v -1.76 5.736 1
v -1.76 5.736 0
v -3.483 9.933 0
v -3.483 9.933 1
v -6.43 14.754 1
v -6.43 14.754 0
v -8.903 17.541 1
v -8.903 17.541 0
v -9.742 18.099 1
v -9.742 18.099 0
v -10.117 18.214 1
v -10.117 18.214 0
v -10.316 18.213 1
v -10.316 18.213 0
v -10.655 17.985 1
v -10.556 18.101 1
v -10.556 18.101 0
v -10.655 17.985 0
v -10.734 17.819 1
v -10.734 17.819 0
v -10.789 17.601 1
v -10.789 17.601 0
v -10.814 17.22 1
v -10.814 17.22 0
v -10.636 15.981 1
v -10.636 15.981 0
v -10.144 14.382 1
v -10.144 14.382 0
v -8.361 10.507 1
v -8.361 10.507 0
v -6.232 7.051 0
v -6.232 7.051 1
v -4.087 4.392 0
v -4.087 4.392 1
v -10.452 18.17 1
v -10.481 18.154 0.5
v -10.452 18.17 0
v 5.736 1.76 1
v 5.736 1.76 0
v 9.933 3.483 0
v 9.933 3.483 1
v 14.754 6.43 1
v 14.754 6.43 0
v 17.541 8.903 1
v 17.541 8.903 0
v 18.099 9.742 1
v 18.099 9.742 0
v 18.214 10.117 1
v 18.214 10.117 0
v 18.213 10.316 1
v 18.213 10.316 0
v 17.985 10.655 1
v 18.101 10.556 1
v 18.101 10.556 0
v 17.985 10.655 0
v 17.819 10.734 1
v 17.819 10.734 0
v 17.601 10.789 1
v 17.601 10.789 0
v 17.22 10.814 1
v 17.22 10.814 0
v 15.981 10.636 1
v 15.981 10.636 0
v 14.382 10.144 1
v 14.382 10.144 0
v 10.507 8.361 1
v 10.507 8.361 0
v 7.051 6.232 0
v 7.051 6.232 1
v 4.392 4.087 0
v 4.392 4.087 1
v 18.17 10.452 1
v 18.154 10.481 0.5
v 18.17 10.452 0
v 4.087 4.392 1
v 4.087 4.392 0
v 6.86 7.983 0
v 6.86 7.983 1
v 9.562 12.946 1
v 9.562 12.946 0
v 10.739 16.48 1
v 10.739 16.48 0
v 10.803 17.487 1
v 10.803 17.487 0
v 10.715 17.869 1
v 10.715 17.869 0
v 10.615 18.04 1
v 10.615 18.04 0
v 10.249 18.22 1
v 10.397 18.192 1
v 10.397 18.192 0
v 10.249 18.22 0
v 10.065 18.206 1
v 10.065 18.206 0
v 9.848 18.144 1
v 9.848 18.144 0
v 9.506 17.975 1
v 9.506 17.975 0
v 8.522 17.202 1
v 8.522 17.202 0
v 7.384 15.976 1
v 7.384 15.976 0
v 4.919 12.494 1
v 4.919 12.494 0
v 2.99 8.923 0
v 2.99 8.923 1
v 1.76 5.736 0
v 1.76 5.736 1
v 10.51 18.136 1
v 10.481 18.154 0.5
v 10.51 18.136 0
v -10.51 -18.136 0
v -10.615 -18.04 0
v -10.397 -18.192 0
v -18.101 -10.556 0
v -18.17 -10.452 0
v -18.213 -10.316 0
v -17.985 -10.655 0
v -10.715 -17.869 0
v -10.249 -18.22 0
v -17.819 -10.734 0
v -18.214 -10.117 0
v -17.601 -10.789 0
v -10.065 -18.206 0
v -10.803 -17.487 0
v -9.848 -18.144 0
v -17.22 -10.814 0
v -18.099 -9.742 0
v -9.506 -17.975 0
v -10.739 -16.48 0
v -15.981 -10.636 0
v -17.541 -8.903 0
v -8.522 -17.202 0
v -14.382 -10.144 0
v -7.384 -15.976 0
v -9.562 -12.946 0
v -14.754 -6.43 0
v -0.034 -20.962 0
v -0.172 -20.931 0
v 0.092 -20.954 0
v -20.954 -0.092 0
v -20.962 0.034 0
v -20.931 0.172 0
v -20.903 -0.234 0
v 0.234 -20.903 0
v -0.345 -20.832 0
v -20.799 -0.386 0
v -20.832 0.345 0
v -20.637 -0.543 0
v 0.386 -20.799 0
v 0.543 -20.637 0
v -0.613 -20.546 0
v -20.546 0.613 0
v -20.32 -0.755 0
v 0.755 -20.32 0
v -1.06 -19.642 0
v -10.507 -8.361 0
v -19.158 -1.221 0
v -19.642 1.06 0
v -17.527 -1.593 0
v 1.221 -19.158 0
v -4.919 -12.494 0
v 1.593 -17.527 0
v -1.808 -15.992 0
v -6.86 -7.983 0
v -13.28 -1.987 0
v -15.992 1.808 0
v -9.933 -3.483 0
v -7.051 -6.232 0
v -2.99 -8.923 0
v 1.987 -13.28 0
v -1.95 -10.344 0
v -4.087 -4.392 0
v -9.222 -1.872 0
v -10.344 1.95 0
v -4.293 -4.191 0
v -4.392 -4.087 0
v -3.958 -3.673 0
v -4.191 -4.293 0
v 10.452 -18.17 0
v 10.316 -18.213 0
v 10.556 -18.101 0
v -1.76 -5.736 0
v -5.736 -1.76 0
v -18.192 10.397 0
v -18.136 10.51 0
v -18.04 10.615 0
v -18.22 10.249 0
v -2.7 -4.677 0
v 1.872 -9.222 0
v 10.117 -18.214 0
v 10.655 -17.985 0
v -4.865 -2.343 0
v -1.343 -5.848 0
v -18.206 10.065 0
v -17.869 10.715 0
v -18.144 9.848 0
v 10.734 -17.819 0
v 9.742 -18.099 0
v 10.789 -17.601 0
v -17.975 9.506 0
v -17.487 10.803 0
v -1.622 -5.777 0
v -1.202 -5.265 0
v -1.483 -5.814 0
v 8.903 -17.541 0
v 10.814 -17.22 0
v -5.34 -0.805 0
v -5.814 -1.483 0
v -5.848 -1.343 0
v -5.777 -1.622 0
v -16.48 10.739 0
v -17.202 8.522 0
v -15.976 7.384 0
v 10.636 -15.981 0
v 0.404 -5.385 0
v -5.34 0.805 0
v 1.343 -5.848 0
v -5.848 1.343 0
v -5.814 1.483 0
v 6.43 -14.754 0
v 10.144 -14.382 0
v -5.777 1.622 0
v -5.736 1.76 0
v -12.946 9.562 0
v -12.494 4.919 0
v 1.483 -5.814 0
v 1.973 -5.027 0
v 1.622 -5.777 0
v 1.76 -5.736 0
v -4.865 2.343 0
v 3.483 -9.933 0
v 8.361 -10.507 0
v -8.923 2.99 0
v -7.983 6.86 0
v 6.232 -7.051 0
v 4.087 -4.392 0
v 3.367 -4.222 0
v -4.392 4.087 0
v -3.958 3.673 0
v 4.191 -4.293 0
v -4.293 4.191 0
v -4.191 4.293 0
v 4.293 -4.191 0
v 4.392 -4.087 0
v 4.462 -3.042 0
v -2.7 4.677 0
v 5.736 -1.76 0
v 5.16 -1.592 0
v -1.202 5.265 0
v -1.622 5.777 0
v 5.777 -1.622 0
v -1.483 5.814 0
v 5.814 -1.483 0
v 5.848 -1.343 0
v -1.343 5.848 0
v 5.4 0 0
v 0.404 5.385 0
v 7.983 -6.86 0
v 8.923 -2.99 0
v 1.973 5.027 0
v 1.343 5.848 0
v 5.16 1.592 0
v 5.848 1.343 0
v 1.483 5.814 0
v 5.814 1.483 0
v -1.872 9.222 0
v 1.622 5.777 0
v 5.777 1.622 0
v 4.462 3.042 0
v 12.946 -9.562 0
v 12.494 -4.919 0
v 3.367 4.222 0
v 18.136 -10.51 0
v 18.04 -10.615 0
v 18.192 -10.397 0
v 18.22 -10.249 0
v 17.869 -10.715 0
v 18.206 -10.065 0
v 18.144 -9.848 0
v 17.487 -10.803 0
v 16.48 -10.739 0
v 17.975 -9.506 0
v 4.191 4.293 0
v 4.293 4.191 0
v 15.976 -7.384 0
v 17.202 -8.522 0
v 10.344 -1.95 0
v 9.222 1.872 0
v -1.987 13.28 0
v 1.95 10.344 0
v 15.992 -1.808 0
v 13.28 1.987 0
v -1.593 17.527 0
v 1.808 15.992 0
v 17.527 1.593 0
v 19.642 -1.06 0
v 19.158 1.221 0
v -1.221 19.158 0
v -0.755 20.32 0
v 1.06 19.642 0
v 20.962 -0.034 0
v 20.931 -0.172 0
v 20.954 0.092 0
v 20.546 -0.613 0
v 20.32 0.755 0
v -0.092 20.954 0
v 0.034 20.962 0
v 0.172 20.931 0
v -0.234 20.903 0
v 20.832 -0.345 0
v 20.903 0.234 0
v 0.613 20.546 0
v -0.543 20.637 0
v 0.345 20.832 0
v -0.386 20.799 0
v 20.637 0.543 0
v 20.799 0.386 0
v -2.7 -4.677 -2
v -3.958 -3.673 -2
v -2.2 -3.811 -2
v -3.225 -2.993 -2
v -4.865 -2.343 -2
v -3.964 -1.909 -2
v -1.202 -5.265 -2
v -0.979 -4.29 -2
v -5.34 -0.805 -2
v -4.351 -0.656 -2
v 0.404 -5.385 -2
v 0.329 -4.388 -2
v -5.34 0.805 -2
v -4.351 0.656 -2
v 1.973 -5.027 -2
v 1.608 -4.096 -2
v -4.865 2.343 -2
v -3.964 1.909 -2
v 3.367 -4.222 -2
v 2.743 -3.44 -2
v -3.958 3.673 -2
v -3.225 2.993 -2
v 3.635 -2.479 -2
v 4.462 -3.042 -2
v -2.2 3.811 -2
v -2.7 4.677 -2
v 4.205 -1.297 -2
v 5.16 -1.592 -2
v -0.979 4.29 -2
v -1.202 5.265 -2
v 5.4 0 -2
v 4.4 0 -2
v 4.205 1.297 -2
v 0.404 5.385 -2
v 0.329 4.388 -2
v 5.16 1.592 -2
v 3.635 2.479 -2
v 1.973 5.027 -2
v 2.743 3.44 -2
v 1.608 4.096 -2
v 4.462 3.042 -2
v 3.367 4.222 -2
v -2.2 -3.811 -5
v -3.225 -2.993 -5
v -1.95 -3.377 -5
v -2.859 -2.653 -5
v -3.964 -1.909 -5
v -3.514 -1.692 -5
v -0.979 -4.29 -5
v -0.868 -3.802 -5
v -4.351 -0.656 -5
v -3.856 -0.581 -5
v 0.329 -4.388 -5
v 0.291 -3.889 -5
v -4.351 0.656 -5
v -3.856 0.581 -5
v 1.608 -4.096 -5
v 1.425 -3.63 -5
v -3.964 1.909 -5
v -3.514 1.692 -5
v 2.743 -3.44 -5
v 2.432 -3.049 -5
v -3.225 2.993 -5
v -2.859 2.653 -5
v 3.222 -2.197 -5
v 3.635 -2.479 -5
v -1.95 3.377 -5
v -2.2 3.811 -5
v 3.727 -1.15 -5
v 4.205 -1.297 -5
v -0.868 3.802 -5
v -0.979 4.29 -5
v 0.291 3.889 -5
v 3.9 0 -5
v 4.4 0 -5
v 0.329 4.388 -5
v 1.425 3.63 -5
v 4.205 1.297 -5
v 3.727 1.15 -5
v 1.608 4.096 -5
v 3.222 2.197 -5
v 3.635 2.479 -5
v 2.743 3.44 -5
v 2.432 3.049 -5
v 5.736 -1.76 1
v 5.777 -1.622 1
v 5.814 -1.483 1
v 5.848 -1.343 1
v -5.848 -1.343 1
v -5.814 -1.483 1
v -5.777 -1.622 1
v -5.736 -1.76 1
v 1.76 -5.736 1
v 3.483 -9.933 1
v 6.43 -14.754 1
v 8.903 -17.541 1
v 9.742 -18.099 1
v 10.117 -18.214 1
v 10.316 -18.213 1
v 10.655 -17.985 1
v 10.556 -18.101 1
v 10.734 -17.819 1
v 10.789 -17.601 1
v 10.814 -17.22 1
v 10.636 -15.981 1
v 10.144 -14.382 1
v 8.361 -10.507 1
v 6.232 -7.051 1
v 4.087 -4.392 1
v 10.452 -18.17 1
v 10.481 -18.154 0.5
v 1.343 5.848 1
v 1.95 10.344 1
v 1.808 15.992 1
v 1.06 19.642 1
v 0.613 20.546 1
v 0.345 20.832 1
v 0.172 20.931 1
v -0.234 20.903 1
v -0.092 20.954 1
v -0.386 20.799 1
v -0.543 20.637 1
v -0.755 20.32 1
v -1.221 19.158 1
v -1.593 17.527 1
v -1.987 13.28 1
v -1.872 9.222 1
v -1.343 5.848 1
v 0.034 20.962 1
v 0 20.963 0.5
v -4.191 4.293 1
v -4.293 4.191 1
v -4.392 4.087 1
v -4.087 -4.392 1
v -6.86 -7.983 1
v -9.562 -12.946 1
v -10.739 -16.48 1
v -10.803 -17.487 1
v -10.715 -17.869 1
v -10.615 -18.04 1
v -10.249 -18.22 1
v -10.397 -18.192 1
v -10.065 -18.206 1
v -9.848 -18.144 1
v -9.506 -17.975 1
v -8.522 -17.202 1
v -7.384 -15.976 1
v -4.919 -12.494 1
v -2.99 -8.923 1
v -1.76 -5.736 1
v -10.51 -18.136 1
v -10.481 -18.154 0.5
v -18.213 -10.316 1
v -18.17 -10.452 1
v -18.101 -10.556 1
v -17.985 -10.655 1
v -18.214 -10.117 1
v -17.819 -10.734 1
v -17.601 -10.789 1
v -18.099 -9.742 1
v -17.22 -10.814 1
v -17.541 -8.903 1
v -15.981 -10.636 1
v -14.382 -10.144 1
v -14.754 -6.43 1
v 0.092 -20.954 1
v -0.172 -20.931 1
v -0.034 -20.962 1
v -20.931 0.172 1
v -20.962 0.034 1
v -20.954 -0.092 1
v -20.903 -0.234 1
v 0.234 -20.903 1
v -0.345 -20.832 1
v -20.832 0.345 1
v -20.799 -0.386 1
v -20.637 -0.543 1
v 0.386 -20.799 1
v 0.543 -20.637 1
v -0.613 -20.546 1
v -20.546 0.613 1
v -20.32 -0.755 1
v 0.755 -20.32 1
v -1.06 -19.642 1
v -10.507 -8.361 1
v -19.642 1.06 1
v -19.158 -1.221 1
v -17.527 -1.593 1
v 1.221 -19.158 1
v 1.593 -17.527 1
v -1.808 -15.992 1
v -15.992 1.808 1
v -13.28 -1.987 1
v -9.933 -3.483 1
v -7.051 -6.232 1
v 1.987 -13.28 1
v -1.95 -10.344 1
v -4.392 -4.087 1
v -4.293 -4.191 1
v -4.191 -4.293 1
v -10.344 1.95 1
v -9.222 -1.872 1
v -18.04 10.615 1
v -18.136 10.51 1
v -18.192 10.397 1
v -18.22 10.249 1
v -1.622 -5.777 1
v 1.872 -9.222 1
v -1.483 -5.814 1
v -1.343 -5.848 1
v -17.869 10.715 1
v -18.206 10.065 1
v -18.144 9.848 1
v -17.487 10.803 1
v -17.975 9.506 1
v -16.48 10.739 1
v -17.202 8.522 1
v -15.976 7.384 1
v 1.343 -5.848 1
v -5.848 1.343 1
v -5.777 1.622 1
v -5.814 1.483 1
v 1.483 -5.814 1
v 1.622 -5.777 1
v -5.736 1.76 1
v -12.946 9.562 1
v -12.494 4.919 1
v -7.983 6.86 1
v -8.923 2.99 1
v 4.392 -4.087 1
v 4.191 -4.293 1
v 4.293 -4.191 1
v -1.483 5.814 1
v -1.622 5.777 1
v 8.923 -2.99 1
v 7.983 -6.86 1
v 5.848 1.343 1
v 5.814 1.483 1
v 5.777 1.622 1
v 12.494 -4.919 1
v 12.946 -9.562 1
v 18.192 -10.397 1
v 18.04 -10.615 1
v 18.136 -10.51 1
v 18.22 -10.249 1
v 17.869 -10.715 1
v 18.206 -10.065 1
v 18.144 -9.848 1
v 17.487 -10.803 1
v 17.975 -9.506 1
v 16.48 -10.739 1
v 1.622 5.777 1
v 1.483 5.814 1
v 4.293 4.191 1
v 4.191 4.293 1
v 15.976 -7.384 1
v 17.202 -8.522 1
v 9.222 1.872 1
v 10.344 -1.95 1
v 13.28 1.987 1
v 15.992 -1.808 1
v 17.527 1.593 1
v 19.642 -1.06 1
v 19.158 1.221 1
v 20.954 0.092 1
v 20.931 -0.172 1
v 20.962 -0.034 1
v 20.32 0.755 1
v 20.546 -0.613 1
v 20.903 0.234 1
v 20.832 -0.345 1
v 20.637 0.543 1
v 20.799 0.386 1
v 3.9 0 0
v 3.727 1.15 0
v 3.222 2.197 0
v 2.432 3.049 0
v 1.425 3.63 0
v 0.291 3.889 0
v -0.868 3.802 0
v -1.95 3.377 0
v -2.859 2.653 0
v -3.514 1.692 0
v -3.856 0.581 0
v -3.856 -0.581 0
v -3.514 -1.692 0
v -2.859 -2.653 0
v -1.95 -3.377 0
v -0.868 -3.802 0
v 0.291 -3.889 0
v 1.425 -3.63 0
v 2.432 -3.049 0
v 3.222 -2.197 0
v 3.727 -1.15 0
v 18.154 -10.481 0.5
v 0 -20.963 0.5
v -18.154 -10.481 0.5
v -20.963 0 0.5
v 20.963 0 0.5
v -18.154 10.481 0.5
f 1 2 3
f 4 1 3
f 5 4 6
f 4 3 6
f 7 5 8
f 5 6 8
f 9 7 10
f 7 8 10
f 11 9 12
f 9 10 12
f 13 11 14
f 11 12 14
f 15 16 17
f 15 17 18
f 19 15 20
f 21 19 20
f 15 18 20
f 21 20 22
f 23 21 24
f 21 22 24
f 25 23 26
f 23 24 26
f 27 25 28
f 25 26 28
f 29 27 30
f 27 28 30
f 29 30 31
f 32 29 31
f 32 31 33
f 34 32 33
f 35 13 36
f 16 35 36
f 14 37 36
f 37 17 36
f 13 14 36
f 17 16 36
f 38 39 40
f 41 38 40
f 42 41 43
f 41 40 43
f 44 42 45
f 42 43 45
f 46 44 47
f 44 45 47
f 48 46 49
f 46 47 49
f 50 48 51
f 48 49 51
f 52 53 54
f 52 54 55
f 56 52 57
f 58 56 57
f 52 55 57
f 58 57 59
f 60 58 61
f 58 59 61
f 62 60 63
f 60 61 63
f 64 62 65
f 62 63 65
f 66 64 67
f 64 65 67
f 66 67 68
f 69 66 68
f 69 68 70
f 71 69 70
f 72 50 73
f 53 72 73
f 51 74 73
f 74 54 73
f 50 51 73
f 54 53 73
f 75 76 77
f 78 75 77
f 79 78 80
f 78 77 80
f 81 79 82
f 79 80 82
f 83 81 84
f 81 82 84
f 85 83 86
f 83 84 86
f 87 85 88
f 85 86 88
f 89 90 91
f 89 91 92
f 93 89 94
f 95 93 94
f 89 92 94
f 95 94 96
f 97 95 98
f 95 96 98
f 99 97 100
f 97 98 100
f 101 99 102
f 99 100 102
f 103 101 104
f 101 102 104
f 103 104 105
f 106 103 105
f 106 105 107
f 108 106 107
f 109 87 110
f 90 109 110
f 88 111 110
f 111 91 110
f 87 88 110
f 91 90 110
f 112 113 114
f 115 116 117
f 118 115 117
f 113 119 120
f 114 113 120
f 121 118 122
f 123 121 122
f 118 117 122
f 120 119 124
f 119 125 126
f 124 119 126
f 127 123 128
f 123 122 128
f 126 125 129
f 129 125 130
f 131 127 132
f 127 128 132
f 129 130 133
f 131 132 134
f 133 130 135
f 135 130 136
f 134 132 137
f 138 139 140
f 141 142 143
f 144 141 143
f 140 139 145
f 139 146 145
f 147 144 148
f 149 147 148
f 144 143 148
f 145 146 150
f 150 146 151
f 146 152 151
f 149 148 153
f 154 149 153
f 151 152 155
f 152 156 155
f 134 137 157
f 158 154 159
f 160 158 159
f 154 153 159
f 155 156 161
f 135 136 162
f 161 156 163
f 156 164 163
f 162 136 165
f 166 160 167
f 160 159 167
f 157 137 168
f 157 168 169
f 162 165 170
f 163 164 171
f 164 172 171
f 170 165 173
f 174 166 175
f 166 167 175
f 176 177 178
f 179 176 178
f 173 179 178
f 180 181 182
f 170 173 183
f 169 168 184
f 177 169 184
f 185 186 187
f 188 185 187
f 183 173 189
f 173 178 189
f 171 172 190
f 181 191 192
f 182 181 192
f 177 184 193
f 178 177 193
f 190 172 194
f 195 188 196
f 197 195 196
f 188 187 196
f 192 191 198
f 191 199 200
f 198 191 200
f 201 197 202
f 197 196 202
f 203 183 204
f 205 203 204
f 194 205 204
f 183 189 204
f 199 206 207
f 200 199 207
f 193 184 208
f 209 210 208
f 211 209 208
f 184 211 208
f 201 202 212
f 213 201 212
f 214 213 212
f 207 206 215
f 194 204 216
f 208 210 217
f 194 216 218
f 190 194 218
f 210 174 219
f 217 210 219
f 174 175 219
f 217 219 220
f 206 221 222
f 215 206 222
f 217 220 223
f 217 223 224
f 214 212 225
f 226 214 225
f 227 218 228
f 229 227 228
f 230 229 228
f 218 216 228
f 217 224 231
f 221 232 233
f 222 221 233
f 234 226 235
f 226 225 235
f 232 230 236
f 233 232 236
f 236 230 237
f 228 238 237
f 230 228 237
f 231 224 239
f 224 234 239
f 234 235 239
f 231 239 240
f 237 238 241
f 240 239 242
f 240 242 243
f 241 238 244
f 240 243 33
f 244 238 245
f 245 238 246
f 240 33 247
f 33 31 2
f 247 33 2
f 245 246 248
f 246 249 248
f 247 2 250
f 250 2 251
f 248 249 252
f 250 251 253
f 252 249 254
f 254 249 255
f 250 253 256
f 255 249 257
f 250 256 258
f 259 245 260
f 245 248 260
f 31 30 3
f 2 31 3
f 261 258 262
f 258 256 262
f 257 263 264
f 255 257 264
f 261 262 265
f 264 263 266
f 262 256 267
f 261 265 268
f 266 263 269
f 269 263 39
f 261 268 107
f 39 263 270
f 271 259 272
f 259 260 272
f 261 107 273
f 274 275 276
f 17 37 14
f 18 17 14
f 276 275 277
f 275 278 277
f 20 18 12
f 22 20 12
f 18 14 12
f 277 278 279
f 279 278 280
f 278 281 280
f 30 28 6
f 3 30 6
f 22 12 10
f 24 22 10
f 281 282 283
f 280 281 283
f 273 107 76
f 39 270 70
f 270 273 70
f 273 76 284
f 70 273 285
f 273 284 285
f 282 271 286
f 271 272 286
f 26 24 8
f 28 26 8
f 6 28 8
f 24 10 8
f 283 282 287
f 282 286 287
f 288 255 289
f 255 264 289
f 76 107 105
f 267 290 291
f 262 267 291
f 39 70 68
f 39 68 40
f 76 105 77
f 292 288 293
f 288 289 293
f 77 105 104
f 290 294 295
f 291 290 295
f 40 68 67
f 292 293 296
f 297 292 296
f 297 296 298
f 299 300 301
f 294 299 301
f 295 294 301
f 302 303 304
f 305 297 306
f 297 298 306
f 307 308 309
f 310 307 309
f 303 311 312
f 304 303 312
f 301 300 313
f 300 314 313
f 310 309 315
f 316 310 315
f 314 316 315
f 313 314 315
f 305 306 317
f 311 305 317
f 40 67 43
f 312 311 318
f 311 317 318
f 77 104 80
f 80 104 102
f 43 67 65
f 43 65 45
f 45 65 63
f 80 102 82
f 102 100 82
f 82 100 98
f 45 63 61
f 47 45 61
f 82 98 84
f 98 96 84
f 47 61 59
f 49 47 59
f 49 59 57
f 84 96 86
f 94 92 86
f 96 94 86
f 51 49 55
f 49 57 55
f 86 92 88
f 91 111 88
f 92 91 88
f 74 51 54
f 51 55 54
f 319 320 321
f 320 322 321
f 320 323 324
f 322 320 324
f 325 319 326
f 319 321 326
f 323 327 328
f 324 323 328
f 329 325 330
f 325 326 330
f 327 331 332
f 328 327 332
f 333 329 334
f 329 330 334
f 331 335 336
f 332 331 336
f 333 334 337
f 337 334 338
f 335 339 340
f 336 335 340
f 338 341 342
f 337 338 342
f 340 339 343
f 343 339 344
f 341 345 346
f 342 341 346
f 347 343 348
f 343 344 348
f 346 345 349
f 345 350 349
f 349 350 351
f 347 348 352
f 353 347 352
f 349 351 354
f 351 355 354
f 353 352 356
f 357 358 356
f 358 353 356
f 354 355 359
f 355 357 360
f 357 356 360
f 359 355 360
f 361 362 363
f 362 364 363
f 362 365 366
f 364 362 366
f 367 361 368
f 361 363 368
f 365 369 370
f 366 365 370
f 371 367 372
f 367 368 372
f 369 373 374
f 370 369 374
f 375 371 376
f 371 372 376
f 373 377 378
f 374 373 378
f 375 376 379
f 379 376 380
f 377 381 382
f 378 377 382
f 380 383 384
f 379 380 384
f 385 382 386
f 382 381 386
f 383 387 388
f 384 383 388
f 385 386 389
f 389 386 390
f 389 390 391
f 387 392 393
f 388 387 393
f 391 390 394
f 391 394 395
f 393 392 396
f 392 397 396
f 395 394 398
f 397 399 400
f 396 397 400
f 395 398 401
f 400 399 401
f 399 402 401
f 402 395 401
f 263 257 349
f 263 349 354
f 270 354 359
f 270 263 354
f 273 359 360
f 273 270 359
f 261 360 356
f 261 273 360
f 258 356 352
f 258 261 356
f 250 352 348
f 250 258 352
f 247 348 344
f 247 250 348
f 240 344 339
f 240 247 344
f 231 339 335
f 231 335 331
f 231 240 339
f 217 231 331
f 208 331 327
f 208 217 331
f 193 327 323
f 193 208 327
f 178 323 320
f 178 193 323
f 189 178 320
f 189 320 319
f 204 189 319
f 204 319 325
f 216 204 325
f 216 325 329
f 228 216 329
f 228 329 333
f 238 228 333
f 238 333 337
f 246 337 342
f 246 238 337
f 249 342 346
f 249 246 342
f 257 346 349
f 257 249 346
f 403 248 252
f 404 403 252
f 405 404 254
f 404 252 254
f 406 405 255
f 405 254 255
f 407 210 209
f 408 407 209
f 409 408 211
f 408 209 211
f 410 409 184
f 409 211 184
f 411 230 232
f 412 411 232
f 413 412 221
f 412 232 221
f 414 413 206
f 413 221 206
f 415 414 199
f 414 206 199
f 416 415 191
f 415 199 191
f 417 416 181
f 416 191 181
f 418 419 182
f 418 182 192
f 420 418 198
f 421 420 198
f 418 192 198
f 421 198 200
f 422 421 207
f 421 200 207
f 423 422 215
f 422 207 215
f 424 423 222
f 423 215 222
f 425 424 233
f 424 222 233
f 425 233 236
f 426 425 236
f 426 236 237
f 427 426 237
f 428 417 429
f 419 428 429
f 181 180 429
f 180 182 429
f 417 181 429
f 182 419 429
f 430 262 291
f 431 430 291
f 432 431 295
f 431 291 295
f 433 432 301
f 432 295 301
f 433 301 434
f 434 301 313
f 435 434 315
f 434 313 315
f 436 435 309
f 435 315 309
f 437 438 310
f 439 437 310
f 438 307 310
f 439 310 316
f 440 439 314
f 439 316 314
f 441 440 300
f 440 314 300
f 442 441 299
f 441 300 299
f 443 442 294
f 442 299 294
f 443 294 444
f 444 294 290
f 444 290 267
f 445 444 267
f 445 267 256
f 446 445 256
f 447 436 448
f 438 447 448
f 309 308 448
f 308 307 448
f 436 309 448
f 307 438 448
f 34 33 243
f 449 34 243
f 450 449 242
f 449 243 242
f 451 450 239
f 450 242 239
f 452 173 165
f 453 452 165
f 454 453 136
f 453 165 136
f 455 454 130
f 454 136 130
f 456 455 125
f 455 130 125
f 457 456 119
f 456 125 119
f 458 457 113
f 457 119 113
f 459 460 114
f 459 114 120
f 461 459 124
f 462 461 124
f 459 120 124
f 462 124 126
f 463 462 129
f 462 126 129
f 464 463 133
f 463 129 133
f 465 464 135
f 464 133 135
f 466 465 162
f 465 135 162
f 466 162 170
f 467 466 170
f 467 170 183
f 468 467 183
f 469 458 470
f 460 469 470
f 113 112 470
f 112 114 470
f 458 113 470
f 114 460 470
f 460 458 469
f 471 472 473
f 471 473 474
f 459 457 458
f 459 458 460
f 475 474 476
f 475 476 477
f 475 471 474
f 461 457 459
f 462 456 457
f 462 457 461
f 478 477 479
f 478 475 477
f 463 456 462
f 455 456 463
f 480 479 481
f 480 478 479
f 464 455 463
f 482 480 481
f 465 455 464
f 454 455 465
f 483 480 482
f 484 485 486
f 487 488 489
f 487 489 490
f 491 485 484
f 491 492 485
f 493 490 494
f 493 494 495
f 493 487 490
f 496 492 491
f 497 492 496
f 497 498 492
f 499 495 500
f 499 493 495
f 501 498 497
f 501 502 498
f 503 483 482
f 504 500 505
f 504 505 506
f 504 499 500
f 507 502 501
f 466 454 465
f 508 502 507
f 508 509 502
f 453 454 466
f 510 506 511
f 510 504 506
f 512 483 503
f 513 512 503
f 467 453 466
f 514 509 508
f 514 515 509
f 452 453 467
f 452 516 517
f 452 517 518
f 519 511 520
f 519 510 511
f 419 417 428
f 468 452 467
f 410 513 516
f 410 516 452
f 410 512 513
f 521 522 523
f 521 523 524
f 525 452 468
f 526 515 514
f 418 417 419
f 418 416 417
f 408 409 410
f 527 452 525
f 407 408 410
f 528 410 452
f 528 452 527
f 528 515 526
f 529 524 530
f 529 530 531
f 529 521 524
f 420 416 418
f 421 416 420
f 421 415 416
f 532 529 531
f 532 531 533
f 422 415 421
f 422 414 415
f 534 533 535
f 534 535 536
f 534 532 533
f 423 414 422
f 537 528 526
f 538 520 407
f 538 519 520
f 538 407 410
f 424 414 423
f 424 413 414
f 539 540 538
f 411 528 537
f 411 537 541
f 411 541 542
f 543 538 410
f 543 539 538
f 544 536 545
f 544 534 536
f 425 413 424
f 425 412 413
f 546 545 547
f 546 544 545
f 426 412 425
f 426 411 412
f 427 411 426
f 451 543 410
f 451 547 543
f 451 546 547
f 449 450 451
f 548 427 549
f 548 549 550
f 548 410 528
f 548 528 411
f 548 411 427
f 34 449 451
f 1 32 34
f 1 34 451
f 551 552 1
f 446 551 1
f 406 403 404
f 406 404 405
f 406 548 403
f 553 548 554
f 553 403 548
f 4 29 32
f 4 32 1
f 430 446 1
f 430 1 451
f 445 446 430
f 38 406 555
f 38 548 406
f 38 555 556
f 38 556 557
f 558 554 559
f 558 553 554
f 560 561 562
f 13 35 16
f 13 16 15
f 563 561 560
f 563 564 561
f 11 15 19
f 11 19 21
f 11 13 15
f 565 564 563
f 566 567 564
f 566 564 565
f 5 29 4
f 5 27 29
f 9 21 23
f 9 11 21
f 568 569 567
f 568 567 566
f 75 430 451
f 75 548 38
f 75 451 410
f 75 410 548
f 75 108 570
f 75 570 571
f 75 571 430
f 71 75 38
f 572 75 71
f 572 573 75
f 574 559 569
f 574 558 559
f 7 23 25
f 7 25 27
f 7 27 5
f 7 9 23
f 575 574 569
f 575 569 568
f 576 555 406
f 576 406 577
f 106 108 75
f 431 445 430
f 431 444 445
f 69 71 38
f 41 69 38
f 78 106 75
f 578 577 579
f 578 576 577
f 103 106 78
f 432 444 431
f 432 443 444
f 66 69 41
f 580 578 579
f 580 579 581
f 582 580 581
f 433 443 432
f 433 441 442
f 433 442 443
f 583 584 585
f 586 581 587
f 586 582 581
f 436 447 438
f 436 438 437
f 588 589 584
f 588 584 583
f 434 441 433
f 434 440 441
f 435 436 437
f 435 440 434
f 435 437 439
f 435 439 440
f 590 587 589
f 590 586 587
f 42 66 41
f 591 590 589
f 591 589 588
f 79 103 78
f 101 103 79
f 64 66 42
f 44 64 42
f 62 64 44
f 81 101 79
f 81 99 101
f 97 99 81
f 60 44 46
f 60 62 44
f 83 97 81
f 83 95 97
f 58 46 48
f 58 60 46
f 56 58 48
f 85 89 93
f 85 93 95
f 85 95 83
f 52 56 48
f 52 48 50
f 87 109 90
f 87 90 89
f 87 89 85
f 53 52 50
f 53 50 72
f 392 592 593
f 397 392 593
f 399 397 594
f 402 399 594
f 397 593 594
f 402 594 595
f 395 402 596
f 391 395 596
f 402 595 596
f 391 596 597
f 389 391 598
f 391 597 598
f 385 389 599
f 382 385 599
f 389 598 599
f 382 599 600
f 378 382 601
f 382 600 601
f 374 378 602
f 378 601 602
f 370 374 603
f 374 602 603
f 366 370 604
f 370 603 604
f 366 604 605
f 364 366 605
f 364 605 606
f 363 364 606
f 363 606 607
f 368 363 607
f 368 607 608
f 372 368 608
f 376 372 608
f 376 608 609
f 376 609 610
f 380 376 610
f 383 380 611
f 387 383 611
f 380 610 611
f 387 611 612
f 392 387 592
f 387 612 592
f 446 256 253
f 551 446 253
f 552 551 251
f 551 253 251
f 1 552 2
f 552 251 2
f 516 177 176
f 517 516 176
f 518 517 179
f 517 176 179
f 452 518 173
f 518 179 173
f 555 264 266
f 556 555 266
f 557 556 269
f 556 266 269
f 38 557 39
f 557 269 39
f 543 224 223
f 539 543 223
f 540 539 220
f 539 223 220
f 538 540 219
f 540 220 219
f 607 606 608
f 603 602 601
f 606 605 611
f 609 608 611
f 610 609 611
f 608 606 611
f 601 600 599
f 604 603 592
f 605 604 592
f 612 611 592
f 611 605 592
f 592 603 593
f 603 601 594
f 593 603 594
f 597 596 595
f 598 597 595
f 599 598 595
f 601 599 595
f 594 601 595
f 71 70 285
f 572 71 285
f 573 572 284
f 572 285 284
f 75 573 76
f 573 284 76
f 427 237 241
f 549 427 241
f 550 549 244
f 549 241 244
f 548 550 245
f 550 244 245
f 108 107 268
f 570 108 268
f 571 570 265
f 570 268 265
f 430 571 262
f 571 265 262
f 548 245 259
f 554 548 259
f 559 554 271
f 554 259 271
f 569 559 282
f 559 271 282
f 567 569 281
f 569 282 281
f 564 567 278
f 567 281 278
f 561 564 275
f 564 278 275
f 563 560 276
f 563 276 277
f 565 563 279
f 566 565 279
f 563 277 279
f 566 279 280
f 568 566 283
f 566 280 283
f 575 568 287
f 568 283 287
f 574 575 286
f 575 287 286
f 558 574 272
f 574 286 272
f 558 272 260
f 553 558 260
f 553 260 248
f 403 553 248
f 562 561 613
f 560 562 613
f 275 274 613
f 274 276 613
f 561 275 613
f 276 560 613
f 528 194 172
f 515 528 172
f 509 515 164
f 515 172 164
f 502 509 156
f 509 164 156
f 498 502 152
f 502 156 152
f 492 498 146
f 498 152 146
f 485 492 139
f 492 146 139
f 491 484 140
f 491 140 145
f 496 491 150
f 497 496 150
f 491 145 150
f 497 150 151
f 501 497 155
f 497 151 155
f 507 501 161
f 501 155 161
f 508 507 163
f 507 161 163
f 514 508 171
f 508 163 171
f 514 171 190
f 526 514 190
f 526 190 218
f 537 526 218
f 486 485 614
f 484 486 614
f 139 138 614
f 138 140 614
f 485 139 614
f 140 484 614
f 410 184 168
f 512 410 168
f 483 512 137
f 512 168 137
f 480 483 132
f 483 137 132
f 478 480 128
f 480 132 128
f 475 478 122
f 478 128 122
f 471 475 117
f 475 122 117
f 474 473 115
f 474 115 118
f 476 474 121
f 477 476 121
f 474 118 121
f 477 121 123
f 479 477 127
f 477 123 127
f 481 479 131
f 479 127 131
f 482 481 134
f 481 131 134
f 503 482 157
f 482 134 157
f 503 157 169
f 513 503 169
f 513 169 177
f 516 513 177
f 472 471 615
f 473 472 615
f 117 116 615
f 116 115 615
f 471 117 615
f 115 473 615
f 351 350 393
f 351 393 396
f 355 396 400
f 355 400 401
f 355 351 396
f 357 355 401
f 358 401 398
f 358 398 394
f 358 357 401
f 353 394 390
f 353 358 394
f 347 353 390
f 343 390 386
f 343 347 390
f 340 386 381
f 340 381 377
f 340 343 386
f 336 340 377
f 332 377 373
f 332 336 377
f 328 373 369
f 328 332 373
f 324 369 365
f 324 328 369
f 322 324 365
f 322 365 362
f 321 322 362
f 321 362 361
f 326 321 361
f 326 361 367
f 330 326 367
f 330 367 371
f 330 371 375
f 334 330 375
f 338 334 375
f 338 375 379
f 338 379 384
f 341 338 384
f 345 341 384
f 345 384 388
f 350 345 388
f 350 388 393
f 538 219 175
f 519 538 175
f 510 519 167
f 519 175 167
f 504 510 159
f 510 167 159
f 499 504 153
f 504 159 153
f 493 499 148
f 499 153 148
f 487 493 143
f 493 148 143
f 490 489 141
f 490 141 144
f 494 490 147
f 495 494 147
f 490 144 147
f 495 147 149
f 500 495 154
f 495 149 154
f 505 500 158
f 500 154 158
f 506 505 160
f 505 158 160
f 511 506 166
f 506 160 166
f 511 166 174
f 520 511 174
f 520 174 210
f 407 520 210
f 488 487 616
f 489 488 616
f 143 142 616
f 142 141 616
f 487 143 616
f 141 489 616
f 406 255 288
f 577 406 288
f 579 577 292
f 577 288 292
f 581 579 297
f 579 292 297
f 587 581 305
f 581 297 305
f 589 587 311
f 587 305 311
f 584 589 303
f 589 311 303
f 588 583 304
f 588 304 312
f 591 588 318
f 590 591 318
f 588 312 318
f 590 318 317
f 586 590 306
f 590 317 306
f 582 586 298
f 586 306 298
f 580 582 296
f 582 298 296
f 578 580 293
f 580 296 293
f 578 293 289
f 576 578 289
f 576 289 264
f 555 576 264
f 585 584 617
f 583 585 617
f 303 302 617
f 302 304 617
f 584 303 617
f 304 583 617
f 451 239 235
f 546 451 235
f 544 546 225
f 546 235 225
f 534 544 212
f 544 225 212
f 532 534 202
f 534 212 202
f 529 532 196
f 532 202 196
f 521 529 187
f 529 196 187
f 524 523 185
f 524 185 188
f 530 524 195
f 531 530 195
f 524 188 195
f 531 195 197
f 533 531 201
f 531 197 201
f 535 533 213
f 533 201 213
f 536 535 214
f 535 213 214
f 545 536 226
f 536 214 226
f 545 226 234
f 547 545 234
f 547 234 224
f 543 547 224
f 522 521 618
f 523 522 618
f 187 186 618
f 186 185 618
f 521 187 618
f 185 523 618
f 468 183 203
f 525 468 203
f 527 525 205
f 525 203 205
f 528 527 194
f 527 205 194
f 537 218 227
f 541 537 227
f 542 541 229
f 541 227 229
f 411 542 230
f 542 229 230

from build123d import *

# Parameters (mm, degrees)
F1_DEPTH = 1
F3_COUNT = 12
F4_R     = 4.4
F4_R_2   = 3.9
F5_DEPTH = 5
F4_R_3   = 5.4
F6_DEPTH = 2


with BuildPart() as f1:
    # F0 (on Top) → F1 (new body)
    with BuildSketch(Plane.XY):
        with BuildLine():
            ThreePointArc((-1.3434482678, 5.8476616482), (-3.7376001922, -4.6936494121), (6, 0))
            ThreePointArc((6, 0), (4.6936494121, 3.7376001922), (1.3434482678, 5.8476616482))
            add(Edge.make_bspline(
                [(0, 3.5970555618), (0.771741269, 3.5970555618), (1.3434482678, 5.8476616482)],
                knots=[0, 0, 0, 0.7365337291, 0.7365337291, 0.7365337291], degree=2, weights=[1, 0.9329526736, 1]))
            add(Edge.make_bspline(
                [(-1.3434482678, 5.8476616482), (-0.771741269, 3.5970555618), (0, 3.5970555618)],
                knots=[5.5466515781, 5.5466515781, 5.5466515781, 6.2831853072, 6.2831853072, 6.2831853072], degree=2, weights=[1, 0.9329526736, 1]))
        make_face()
        with BuildLine():
            ThreePointArc((-1.3434482678, 5.8476616482), (0, 6), (1.3434482678, 5.8476616482))
            add(Edge.make_bspline(
                [(1.3434482678, 5.8476616482), (5.1830842287, 20.9629358724), (0, 20.9629358724), (-5.1830842287, 20.9629358724), (-1.3434482678, 5.8476616482)],
                knots=[0.7365337291, 0.7365337291, 0.7365337291, 3.1415926536, 3.1415926536, 5.5466515781, 5.5466515781, 5.5466515781], degree=2, weights=[1, 0.3599990401, 1, 0.3599990401, 1]))
        make_face()
        with BuildLine():
            add(Edge.make_bspline(
                [(0, 3.5970555618), (0.771741269, 3.5970555618), (1.3434482678, 5.8476616482)],
                knots=[0, 0, 0, 0.7365337291, 0.7365337291, 0.7365337291], degree=2, weights=[1, 0.9329526736, 1]))
            ThreePointArc((1.3434482678, 5.8476616482), (0, 6), (-1.3434482678, 5.8476616482))
            add(Edge.make_bspline(
                [(-1.3434482678, 5.8476616482), (-0.771741269, 3.5970555618), (0, 3.5970555618)],
                knots=[5.5466515781, 5.5466515781, 5.5466515781, 6.2831853072, 6.2831853072, 6.2831853072], degree=2, weights=[1, 0.9329526736, 1]))
        make_face()
    extrude(amount=F1_DEPTH)


with BuildPart() as f3_1:
    # F3: instance of F1
    add(f1.part.rotate(Axis((0, 0, 8.796742186), (0, 0, -1)), 1 * 360 / F3_COUNT))


with BuildPart() as f3_2:
    # F3: instance of F1
    add(f1.part.rotate(Axis((0, 0, 8.796742186), (0, 0, -1)), 2 * 360 / F3_COUNT))


with BuildPart() as f3_3:
    # F3: instance of F1
    add(f1.part.rotate(Axis((0, 0, 8.796742186), (0, 0, -1)), 3 * 360 / F3_COUNT))


with BuildPart() as f3_4:
    # F3: instance of F1
    add(f1.part.rotate(Axis((0, 0, 8.796742186), (0, 0, -1)), 4 * 360 / F3_COUNT))


with BuildPart() as f3_5:
    # F3: instance of F1
    add(f1.part.rotate(Axis((0, 0, 8.796742186), (0, 0, -1)), 5 * 360 / F3_COUNT))


with BuildPart() as f3_6:
    # F3: instance of F1
    add(f1.part.rotate(Axis((0, 0, 8.796742186), (0, 0, -1)), 6 * 360 / F3_COUNT))


with BuildPart() as f3_7:
    # F3: instance of F1
    add(f1.part.rotate(Axis((0, 0, 8.796742186), (0, 0, -1)), 7 * 360 / F3_COUNT))


with BuildPart() as f3_8:
    # F3: instance of F1
    add(f1.part.rotate(Axis((0, 0, 8.796742186), (0, 0, -1)), 8 * 360 / F3_COUNT))


with BuildPart() as f3_9:
    # F3: instance of F1
    add(f1.part.rotate(Axis((0, 0, 8.796742186), (0, 0, -1)), 9 * 360 / F3_COUNT))


with BuildPart() as f3_10:
    # F3: instance of F1
    add(f1.part.rotate(Axis((0, 0, 8.796742186), (0, 0, -1)), 10 * 360 / F3_COUNT))


with BuildPart() as f3_11:
    # F3: instance of F1
    add(f1.part.rotate(Axis((0, 0, 8.796742186), (0, 0, -1)), 11 * 360 / F3_COUNT))


with BuildPart() as f1_1:
    add(f1.part)

    add(f3_1.part)  # F5 merges F3_1

    add(f3_2.part)  # F5 merges F3_2

    add(f3_3.part)  # F5 merges F3_3

    add(f3_4.part)  # F5 merges F3_4

    add(f3_5.part)  # F5 merges F3_5

    add(f3_6.part)  # F5 merges F3_6

    add(f3_7.part)  # F5 merges F3_7

    add(f3_8.part)  # F5 merges F3_8

    add(f3_9.part)  # F5 merges F3_9

    add(f3_10.part)  # F5 merges F3_10

    add(f3_11.part)  # F5 merges F3_11
    # F4 (on Top) → F5 (join)
    with BuildSketch(Plane.XY):
        Circle(F4_R)
        Circle(F4_R_2, mode=Mode.SUBTRACT)
    extrude(amount=-F5_DEPTH)

    # F4 (on Top) → F6 (join)
    with BuildSketch(Plane.XY):
        Circle(F4_R_3)
        Circle(F4_R, mode=Mode.SUBTRACT)
    extrude(amount=-F6_DEPTH)


solid = f1_1.part
